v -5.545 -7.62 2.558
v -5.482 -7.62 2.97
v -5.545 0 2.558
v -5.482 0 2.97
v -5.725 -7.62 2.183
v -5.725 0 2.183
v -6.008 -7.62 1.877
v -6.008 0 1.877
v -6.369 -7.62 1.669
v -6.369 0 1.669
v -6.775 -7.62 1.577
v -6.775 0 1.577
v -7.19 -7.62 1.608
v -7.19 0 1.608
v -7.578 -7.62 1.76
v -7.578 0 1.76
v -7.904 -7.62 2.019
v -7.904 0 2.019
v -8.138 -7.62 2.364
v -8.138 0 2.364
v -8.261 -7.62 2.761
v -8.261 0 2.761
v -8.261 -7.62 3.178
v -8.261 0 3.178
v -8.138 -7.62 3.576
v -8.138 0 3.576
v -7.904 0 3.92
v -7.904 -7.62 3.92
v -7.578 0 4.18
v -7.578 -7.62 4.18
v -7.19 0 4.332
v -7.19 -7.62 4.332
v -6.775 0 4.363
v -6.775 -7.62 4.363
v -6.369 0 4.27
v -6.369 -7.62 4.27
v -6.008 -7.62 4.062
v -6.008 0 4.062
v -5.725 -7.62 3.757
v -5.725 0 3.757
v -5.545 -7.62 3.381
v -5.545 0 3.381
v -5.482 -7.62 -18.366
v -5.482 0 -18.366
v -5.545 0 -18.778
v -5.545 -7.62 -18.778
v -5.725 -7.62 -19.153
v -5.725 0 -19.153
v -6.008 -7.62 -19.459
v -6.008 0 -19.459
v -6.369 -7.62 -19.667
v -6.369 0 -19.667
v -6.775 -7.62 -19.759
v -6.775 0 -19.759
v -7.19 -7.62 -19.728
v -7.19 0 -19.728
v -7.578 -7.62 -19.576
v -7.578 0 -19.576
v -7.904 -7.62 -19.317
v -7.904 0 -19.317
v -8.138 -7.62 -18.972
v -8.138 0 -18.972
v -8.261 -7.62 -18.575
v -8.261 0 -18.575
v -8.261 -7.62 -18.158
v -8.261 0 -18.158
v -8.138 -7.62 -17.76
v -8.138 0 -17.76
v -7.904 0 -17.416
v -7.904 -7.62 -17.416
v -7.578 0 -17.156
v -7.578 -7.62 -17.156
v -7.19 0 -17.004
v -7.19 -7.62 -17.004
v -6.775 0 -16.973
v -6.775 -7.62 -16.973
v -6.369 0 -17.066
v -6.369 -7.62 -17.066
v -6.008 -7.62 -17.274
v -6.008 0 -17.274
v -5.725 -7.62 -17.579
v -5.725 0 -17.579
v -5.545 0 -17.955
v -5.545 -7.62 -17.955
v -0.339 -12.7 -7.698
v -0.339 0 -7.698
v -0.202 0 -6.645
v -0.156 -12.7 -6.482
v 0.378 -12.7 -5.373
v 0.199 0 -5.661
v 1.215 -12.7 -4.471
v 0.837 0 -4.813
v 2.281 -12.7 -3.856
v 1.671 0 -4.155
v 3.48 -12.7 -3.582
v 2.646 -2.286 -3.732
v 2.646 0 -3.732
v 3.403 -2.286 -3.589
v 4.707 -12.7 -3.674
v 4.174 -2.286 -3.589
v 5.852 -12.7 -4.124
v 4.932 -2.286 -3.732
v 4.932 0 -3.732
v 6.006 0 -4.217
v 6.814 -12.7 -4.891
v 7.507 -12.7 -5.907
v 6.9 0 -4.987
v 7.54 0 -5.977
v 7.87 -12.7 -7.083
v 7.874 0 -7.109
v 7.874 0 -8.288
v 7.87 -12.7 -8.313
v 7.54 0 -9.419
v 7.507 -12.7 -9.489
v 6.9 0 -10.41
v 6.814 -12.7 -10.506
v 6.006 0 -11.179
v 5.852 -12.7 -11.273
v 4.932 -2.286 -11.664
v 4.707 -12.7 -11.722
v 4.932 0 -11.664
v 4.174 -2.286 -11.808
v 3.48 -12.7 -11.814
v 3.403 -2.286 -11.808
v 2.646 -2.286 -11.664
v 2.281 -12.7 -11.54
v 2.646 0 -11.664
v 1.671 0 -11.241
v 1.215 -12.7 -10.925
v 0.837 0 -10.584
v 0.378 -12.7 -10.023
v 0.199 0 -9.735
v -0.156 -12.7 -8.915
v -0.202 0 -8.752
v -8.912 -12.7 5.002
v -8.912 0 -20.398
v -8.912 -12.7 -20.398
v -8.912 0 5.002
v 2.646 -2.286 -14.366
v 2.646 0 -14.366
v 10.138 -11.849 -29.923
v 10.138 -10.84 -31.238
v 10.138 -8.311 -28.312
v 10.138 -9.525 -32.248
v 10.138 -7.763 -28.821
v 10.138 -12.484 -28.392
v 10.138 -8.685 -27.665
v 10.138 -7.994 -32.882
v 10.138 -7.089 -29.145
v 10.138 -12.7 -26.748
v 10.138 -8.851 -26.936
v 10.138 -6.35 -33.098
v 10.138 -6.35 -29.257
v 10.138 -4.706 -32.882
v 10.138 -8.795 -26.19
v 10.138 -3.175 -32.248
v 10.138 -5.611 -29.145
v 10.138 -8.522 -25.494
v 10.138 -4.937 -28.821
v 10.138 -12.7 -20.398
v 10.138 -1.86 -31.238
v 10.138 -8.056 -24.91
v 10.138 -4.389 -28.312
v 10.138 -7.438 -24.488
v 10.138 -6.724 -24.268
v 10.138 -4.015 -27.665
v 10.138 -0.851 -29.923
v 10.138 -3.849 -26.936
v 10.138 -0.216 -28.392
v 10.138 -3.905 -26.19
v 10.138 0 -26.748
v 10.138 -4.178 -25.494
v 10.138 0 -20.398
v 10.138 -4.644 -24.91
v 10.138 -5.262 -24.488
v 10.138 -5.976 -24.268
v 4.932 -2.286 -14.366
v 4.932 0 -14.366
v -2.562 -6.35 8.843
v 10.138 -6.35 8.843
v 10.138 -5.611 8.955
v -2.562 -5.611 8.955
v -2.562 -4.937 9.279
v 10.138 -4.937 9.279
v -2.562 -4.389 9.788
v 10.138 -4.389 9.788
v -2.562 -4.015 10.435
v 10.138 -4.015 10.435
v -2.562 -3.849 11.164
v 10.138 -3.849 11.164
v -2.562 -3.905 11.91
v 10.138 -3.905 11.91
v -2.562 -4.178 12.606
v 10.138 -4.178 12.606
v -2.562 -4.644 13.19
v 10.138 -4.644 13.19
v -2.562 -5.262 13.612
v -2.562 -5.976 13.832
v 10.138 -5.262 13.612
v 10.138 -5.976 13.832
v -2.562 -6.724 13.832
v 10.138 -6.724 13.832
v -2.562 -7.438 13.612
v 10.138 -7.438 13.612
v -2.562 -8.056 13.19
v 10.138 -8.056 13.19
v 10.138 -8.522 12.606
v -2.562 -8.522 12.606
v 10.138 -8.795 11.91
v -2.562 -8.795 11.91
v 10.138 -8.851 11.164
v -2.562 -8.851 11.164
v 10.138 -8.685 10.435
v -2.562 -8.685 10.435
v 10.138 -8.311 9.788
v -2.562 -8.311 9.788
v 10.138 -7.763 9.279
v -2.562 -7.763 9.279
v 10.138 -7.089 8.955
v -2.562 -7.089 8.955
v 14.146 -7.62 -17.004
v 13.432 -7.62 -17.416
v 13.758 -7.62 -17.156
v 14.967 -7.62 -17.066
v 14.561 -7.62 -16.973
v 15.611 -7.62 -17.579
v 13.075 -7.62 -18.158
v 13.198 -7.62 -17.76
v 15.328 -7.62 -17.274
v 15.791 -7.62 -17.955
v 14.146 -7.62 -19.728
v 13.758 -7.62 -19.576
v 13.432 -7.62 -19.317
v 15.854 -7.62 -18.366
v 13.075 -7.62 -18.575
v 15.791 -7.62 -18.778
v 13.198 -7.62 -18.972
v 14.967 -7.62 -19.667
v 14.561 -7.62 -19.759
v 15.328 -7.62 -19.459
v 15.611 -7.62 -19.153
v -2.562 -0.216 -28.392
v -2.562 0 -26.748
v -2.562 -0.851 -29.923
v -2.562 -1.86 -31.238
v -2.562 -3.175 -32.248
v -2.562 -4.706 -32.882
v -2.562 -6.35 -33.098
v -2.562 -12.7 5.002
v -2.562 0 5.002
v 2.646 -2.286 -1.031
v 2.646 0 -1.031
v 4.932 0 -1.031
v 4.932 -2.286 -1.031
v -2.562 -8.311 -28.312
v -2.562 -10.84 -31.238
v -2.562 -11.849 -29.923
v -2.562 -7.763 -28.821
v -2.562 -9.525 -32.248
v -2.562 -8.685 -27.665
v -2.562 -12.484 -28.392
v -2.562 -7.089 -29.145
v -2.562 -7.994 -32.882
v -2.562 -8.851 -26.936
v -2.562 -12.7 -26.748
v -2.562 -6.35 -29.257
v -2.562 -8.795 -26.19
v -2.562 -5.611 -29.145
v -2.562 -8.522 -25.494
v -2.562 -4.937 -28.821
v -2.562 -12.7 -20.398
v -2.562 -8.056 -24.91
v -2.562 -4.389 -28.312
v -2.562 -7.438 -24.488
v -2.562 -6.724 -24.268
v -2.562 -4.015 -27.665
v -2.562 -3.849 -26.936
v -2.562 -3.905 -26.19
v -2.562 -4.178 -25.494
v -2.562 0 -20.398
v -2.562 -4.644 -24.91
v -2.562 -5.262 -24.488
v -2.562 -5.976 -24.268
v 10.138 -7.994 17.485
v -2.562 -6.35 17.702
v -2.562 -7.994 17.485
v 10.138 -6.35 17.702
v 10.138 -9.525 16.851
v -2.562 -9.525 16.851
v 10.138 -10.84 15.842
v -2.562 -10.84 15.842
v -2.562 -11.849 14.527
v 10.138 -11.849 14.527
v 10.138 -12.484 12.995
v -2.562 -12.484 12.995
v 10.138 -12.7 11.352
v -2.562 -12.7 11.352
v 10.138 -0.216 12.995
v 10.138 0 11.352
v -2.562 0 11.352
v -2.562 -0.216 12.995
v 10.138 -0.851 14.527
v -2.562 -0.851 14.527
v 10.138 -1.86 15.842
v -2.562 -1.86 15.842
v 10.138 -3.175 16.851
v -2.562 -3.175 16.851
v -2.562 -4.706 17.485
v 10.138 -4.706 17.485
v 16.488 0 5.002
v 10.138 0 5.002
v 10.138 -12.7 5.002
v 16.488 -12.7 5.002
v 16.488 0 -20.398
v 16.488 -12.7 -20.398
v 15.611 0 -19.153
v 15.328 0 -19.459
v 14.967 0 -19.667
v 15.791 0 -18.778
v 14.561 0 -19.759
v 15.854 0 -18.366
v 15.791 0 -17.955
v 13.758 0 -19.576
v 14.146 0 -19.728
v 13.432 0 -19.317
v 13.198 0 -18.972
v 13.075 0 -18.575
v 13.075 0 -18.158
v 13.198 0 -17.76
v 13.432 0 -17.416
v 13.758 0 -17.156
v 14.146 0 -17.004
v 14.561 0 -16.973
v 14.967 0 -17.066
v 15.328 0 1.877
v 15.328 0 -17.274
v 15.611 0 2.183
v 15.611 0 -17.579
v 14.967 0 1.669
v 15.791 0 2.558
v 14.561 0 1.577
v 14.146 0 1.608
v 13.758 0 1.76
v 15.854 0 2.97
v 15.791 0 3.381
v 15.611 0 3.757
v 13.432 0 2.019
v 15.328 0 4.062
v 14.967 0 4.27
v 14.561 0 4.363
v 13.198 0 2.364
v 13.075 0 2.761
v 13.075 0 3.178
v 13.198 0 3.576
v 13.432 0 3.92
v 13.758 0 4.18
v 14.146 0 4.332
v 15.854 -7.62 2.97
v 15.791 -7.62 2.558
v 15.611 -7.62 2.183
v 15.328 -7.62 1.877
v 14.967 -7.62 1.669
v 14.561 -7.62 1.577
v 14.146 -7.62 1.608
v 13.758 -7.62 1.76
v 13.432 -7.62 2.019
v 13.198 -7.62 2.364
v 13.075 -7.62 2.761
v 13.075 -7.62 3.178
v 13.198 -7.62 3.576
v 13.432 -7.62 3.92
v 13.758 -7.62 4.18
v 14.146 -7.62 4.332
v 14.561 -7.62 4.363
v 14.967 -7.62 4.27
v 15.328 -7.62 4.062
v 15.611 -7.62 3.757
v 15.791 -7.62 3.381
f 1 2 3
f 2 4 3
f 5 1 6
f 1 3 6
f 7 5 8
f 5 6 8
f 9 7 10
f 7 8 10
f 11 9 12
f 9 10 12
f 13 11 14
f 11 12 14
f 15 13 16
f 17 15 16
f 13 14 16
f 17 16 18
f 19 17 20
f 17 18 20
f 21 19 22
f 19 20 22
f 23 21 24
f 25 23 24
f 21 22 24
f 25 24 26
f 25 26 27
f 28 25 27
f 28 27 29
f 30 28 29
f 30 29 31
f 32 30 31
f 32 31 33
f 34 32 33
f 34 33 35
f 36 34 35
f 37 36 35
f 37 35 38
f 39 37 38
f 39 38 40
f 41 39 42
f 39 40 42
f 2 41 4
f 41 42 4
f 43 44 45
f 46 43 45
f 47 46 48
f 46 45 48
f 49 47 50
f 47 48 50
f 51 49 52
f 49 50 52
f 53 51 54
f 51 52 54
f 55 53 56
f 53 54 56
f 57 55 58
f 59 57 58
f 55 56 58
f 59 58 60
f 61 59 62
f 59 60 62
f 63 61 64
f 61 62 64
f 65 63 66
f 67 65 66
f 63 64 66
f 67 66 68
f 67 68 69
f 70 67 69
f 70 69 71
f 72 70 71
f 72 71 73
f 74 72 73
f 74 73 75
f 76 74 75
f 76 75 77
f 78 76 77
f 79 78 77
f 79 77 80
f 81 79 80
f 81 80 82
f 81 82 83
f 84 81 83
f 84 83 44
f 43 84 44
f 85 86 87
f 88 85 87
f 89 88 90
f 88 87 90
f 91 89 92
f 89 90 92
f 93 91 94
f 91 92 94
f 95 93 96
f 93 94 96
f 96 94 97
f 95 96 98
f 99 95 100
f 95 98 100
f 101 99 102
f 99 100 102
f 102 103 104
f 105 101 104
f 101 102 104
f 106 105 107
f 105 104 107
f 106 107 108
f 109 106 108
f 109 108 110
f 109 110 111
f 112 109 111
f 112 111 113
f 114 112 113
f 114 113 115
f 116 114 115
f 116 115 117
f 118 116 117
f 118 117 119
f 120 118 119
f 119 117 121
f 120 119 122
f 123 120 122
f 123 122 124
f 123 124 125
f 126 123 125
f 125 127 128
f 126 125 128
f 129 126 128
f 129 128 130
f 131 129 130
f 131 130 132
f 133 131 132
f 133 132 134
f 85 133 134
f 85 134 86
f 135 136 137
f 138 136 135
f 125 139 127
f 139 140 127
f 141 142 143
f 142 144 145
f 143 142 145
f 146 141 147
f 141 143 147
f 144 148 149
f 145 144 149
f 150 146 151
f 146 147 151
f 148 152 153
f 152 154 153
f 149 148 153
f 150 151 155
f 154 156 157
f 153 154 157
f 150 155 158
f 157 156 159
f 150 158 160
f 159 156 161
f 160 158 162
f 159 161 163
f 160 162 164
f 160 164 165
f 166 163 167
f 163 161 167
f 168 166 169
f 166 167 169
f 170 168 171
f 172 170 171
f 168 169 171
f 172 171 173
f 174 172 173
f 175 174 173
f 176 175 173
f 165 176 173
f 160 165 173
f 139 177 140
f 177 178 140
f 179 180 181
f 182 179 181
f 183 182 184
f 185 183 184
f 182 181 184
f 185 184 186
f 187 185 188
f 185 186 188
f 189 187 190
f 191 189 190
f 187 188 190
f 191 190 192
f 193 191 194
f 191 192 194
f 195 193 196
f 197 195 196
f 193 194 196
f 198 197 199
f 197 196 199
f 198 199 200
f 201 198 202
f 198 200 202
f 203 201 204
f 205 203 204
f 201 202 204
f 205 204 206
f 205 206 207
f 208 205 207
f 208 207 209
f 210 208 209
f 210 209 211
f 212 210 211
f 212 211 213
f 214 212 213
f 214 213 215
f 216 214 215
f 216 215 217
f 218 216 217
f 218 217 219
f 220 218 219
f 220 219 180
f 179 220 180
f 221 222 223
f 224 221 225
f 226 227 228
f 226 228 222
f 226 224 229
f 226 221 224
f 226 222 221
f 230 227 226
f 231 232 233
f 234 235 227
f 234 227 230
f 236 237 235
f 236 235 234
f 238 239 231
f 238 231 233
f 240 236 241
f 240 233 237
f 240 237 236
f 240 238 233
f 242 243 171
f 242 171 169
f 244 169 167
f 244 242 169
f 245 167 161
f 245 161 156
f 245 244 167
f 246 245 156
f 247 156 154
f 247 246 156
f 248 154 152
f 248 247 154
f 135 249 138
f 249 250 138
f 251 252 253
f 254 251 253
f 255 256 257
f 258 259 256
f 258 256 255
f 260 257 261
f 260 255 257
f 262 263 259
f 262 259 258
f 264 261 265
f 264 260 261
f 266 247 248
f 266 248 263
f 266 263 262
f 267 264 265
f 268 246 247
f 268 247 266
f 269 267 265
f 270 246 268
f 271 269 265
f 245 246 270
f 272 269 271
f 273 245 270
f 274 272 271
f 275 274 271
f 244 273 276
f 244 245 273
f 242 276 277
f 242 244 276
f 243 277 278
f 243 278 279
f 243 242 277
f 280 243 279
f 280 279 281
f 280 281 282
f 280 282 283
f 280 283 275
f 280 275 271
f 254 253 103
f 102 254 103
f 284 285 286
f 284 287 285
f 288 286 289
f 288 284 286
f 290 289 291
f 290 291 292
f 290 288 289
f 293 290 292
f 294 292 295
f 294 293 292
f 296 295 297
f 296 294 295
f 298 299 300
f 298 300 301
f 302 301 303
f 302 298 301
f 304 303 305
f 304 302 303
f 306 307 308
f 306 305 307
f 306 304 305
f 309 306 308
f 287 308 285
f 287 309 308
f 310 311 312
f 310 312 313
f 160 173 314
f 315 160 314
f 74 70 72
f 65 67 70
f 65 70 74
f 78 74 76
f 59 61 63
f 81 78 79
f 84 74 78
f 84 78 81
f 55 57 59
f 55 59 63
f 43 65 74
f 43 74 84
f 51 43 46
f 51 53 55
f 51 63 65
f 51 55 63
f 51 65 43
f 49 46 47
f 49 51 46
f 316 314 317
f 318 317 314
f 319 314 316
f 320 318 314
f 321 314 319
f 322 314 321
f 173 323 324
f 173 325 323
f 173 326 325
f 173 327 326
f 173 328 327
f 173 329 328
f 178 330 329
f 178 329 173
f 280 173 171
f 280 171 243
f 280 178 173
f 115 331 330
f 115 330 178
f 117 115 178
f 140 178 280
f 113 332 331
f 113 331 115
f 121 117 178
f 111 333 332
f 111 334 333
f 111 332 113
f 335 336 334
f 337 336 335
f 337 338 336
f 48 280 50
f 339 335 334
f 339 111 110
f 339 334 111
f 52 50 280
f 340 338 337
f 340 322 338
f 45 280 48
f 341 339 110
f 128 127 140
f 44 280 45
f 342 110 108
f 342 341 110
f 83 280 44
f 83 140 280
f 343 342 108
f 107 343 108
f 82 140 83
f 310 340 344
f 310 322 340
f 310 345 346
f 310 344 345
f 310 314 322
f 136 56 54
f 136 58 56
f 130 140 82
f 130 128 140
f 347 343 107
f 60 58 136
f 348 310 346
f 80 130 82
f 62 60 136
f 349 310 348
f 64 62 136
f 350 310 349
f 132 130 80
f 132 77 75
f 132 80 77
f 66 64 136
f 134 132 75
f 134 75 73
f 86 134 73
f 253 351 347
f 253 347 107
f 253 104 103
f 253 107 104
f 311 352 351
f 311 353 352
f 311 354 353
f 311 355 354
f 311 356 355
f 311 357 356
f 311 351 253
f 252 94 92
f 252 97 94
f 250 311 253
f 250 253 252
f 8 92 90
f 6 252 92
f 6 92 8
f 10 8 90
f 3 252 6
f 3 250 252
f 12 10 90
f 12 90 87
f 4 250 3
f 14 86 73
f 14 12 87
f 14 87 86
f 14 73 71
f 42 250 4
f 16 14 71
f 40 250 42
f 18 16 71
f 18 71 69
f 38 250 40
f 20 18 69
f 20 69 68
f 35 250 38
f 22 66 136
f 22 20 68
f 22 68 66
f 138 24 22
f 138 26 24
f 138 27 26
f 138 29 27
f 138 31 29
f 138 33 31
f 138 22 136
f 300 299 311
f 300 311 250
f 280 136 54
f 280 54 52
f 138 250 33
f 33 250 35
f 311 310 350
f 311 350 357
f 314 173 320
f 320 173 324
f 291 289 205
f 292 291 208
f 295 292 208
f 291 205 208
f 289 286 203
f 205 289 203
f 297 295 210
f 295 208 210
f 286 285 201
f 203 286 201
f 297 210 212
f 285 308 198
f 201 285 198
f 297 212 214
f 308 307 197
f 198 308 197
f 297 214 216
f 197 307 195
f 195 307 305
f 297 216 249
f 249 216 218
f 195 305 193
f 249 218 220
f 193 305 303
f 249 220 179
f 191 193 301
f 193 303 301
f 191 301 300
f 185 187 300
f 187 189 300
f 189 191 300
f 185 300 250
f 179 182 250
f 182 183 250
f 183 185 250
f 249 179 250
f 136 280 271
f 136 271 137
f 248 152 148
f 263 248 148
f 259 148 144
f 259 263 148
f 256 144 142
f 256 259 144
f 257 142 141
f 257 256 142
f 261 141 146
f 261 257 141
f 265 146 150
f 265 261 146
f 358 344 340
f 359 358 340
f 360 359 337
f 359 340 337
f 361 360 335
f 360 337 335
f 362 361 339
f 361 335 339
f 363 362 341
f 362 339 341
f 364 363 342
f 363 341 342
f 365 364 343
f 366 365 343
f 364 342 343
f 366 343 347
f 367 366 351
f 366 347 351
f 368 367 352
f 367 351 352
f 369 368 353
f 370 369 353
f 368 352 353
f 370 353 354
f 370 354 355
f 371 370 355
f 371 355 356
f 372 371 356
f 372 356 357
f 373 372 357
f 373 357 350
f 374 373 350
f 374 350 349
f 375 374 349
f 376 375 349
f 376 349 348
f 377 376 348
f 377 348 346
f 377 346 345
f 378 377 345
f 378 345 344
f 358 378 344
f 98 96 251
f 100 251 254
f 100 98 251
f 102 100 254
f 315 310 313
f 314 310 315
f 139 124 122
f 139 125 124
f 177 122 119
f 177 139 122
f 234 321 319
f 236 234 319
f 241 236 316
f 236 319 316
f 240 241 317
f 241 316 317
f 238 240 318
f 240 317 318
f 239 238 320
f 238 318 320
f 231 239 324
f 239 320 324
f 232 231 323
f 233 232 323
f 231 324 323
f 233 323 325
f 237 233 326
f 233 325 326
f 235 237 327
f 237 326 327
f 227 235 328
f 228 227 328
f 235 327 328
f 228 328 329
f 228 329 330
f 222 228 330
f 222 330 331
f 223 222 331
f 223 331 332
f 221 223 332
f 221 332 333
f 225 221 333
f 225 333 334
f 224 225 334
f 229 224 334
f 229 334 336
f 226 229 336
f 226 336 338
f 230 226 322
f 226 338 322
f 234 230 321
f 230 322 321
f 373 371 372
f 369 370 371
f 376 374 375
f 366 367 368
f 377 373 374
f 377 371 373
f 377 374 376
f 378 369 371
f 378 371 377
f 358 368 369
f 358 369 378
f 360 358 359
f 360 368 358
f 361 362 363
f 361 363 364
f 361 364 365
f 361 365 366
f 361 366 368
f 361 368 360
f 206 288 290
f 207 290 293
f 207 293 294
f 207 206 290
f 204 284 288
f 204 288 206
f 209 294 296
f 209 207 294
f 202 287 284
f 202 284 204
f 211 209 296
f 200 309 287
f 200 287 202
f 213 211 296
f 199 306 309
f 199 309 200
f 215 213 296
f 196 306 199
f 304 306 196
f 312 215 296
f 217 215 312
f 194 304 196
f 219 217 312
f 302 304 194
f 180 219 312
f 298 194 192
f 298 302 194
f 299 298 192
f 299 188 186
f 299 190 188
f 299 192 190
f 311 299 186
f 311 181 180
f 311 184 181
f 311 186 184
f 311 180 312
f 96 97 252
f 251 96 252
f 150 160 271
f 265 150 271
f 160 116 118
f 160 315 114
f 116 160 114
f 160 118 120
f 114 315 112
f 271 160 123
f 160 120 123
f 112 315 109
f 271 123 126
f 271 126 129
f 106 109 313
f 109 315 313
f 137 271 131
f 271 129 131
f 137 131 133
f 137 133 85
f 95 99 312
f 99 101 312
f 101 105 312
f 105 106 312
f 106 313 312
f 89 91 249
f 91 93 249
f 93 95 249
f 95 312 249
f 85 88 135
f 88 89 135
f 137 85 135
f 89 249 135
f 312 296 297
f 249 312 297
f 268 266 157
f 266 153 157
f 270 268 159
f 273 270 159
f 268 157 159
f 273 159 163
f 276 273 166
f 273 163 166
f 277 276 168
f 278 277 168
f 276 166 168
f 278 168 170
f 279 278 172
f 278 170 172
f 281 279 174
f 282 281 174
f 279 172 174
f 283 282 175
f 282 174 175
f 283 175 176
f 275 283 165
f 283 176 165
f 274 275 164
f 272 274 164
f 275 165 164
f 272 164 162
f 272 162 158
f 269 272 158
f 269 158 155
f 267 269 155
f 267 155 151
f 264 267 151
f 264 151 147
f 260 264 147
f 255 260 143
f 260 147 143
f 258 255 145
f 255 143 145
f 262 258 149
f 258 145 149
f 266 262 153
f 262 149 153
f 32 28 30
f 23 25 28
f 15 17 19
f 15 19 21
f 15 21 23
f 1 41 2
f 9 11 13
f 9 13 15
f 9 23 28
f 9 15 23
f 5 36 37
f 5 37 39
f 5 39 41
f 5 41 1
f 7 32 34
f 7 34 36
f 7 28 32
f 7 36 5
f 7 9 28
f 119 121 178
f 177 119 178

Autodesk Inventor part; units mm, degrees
ref_plane "YZ Plane" through (0, 0, 0) normal (1, 0, 0) x (0, 1, 0)
ref_plane "XZ Plane" through (0, 0, 0) normal (0, 1, 0) x (-1, 0, 0)
ref_plane "XY Plane" through (0, 0, 0) normal (0, 0, 1) x (1, 0, 0)
sketch "Sketch1" plane through (0, 0, 0) normal (0, 1, 0) x (-1, 0, 0)
  line L0 (8.9115, 17.7017) -> (-16.4885, 17.7017)
  line L1 (-16.4885, 17.7017) -> (-16.4885, -33.0983)
  line L2 (-16.4885, -33.0983) -> (8.9115, -33.0983)
  line L3 (8.9115, -33.0983) -> (8.9115, 17.7017)
  line L4 (8.9115, 17.7017) -> (2.5615, 17.7017)
  line L5 (2.5615, 17.7017) -> (2.5615, 5.0017)
  line L6 (2.5615, 5.0017) -> (8.9115, 5.0017)
  line L7 (8.9115, 5.0017) -> (8.9115, 17.7017)
  line L8 (-16.4885, 17.7017) -> (-10.1385, 17.7017)
  line L9 (-10.1385, 17.7017) -> (-10.1385, 5.0017)
  line L10 (-10.1385, 5.0017) -> (-16.4885, 5.0017)
  line L11 (-16.4885, 5.0017) -> (-16.4885, 17.7017)
  line L12 (8.9115, -33.0983) -> (2.5615, -33.0983)
  line L13 (2.5615, -33.0983) -> (2.5615, -20.3983)
  line L14 (2.5615, -20.3983) -> (8.9115, -20.3983)
  line L15 (8.9115, -20.3983) -> (8.9115, -33.0983)
  line L16 (-16.4885, -33.0983) -> (-10.1385, -33.0983)
  line L17 (-10.1385, -33.0983) -> (-10.1385, -20.3983)
  line L18 (-10.1385, -20.3983) -> (-16.4885, -20.3983)
  line L19 (-16.4885, -20.3983) -> (-16.4885, -33.0983)
  circle A0 centre (-3.7885, -7.6983) radius 4.1275
  point P0 (0, 0)
  dimension "d0" = 25.4
  dimension "d1" = 50.8
  dimension "d2" = 6.35
  dimension "d3" = 12.7
  dimension "d4" = 6.35
  dimension "d5" = 12.7
  dimension "d6" = 6.35
  dimension "d7" = 12.7
  dimension "d8" = 6.35
  dimension "d9" = 12.7
  dimension "d10" = 8.255
extrude "Extrusion1" add sketch "Sketch1" against normal blind 12.7 contours L5 L6 L3 L14 L13 L2 L17 L18 L1 L10 L9 L0
sketch "Sketch2" plane through (10.1385, -12.7, 17.7017) normal (1, 0, 0) x (0, 0, -1)
  circle A0 centre (6.35, 6.35) radius 2.5083
  line L0 (0, 0) -> (0, 12.7) projected
  line L1 (12.7, 0) -> (0, 0) projected
  circle A1 centre (44.45, 6.35) radius 2.5083
  line L2 (38.1, 12.7) -> (50.8, 12.7) projected
  line L3 (50.8, 12.7) -> (50.8, 0) projected
  point P0 (17.7017, 12.7)
  dimension "d13" = 5.0165
  dimension "d14" = 6.35
  dimension "d15" = 6.35
  dimension "d16" = 5.0165
  dimension "d17" = 6.35
  dimension "d18" = 6.35
extrude "Extrusion2" cut sketch "Sketch2" against normal blind 12.7
fillet "Fillet1" radius 6.35 4 edges at (3.7885, 0, 17.7017) (3.7885, -12.7, 17.7017) (3.7885, 0, -33.0983) (3.7885, -12.7, -33.0983)
sketch "Sketch3" plane through (0, 0, 0) normal (0, 1, 0) x (1, 0, 0)
  circle A0 centre (-6.8795, -2.9697) radius 1.397
  line L0 (-8.9115, -5.0017) -> (-2.5615, -5.0017) projected
  line L1 (-8.9115, 20.3983) -> (-8.9115, -5.0017) projected
  circle A1 centre (14.4565, -2.9697) radius 1.397
  line L2 (16.4885, -5.0017) -> (16.4885, 20.3983) projected
  circle A2 centre (14.4565, 18.3663) radius 1.397
  line L3 (16.4885, 20.3983) -> (10.1385, 20.3983) projected
  circle A3 centre (-6.8795, 18.3663) radius 1.397
  point P0 (0, 0)
  dimension "d22" = 2.794
  dimension "d23" = 2.032
  dimension "d24" = 2.032
  dimension "d25" = 2.794
  dimension "d26" = 2.032
  dimension "d27" = 2.794
  dimension "d28" = 2.032
  dimension "d29" = 2.794
extrude "Extrusion3" cut sketch "Sketch3" against normal blind 7.62
sketch "Sketch4" plane through (0, 0, 0) normal (0, 1, 0) x (1, 0, 0)
  line L0 (2.6455, 1.0308) -> (4.9315, 1.0308)
  line L1 (4.9315, 1.0308) -> (4.9315, 3.7322)
  line L2 (2.6455, 3.7322) -> (2.6455, 1.0308)
  circle A0 centre (3.7885, 7.6983) radius 4.1275 projected
  line L3 (4.9315, 14.3658) -> (2.6455, 14.3658)
  line L4 (2.6455, 14.3658) -> (2.6455, 11.6644)
  line L5 (4.9315, 11.6644) -> (4.9315, 14.3658)
  point P0 (0, 0)
  dimension "d32" = 2.286
  dimension "d34" = 8.255
  dimension "d36" = 1.143
  dimension "d37" = 2.286
extrude "Extrusion4" cut sketch "Sketch4" against normal blind 2.286 contours L2 A0 L1 L0 | L4 L3 L5 A0
properties part number "bottom_anchor_v3"
